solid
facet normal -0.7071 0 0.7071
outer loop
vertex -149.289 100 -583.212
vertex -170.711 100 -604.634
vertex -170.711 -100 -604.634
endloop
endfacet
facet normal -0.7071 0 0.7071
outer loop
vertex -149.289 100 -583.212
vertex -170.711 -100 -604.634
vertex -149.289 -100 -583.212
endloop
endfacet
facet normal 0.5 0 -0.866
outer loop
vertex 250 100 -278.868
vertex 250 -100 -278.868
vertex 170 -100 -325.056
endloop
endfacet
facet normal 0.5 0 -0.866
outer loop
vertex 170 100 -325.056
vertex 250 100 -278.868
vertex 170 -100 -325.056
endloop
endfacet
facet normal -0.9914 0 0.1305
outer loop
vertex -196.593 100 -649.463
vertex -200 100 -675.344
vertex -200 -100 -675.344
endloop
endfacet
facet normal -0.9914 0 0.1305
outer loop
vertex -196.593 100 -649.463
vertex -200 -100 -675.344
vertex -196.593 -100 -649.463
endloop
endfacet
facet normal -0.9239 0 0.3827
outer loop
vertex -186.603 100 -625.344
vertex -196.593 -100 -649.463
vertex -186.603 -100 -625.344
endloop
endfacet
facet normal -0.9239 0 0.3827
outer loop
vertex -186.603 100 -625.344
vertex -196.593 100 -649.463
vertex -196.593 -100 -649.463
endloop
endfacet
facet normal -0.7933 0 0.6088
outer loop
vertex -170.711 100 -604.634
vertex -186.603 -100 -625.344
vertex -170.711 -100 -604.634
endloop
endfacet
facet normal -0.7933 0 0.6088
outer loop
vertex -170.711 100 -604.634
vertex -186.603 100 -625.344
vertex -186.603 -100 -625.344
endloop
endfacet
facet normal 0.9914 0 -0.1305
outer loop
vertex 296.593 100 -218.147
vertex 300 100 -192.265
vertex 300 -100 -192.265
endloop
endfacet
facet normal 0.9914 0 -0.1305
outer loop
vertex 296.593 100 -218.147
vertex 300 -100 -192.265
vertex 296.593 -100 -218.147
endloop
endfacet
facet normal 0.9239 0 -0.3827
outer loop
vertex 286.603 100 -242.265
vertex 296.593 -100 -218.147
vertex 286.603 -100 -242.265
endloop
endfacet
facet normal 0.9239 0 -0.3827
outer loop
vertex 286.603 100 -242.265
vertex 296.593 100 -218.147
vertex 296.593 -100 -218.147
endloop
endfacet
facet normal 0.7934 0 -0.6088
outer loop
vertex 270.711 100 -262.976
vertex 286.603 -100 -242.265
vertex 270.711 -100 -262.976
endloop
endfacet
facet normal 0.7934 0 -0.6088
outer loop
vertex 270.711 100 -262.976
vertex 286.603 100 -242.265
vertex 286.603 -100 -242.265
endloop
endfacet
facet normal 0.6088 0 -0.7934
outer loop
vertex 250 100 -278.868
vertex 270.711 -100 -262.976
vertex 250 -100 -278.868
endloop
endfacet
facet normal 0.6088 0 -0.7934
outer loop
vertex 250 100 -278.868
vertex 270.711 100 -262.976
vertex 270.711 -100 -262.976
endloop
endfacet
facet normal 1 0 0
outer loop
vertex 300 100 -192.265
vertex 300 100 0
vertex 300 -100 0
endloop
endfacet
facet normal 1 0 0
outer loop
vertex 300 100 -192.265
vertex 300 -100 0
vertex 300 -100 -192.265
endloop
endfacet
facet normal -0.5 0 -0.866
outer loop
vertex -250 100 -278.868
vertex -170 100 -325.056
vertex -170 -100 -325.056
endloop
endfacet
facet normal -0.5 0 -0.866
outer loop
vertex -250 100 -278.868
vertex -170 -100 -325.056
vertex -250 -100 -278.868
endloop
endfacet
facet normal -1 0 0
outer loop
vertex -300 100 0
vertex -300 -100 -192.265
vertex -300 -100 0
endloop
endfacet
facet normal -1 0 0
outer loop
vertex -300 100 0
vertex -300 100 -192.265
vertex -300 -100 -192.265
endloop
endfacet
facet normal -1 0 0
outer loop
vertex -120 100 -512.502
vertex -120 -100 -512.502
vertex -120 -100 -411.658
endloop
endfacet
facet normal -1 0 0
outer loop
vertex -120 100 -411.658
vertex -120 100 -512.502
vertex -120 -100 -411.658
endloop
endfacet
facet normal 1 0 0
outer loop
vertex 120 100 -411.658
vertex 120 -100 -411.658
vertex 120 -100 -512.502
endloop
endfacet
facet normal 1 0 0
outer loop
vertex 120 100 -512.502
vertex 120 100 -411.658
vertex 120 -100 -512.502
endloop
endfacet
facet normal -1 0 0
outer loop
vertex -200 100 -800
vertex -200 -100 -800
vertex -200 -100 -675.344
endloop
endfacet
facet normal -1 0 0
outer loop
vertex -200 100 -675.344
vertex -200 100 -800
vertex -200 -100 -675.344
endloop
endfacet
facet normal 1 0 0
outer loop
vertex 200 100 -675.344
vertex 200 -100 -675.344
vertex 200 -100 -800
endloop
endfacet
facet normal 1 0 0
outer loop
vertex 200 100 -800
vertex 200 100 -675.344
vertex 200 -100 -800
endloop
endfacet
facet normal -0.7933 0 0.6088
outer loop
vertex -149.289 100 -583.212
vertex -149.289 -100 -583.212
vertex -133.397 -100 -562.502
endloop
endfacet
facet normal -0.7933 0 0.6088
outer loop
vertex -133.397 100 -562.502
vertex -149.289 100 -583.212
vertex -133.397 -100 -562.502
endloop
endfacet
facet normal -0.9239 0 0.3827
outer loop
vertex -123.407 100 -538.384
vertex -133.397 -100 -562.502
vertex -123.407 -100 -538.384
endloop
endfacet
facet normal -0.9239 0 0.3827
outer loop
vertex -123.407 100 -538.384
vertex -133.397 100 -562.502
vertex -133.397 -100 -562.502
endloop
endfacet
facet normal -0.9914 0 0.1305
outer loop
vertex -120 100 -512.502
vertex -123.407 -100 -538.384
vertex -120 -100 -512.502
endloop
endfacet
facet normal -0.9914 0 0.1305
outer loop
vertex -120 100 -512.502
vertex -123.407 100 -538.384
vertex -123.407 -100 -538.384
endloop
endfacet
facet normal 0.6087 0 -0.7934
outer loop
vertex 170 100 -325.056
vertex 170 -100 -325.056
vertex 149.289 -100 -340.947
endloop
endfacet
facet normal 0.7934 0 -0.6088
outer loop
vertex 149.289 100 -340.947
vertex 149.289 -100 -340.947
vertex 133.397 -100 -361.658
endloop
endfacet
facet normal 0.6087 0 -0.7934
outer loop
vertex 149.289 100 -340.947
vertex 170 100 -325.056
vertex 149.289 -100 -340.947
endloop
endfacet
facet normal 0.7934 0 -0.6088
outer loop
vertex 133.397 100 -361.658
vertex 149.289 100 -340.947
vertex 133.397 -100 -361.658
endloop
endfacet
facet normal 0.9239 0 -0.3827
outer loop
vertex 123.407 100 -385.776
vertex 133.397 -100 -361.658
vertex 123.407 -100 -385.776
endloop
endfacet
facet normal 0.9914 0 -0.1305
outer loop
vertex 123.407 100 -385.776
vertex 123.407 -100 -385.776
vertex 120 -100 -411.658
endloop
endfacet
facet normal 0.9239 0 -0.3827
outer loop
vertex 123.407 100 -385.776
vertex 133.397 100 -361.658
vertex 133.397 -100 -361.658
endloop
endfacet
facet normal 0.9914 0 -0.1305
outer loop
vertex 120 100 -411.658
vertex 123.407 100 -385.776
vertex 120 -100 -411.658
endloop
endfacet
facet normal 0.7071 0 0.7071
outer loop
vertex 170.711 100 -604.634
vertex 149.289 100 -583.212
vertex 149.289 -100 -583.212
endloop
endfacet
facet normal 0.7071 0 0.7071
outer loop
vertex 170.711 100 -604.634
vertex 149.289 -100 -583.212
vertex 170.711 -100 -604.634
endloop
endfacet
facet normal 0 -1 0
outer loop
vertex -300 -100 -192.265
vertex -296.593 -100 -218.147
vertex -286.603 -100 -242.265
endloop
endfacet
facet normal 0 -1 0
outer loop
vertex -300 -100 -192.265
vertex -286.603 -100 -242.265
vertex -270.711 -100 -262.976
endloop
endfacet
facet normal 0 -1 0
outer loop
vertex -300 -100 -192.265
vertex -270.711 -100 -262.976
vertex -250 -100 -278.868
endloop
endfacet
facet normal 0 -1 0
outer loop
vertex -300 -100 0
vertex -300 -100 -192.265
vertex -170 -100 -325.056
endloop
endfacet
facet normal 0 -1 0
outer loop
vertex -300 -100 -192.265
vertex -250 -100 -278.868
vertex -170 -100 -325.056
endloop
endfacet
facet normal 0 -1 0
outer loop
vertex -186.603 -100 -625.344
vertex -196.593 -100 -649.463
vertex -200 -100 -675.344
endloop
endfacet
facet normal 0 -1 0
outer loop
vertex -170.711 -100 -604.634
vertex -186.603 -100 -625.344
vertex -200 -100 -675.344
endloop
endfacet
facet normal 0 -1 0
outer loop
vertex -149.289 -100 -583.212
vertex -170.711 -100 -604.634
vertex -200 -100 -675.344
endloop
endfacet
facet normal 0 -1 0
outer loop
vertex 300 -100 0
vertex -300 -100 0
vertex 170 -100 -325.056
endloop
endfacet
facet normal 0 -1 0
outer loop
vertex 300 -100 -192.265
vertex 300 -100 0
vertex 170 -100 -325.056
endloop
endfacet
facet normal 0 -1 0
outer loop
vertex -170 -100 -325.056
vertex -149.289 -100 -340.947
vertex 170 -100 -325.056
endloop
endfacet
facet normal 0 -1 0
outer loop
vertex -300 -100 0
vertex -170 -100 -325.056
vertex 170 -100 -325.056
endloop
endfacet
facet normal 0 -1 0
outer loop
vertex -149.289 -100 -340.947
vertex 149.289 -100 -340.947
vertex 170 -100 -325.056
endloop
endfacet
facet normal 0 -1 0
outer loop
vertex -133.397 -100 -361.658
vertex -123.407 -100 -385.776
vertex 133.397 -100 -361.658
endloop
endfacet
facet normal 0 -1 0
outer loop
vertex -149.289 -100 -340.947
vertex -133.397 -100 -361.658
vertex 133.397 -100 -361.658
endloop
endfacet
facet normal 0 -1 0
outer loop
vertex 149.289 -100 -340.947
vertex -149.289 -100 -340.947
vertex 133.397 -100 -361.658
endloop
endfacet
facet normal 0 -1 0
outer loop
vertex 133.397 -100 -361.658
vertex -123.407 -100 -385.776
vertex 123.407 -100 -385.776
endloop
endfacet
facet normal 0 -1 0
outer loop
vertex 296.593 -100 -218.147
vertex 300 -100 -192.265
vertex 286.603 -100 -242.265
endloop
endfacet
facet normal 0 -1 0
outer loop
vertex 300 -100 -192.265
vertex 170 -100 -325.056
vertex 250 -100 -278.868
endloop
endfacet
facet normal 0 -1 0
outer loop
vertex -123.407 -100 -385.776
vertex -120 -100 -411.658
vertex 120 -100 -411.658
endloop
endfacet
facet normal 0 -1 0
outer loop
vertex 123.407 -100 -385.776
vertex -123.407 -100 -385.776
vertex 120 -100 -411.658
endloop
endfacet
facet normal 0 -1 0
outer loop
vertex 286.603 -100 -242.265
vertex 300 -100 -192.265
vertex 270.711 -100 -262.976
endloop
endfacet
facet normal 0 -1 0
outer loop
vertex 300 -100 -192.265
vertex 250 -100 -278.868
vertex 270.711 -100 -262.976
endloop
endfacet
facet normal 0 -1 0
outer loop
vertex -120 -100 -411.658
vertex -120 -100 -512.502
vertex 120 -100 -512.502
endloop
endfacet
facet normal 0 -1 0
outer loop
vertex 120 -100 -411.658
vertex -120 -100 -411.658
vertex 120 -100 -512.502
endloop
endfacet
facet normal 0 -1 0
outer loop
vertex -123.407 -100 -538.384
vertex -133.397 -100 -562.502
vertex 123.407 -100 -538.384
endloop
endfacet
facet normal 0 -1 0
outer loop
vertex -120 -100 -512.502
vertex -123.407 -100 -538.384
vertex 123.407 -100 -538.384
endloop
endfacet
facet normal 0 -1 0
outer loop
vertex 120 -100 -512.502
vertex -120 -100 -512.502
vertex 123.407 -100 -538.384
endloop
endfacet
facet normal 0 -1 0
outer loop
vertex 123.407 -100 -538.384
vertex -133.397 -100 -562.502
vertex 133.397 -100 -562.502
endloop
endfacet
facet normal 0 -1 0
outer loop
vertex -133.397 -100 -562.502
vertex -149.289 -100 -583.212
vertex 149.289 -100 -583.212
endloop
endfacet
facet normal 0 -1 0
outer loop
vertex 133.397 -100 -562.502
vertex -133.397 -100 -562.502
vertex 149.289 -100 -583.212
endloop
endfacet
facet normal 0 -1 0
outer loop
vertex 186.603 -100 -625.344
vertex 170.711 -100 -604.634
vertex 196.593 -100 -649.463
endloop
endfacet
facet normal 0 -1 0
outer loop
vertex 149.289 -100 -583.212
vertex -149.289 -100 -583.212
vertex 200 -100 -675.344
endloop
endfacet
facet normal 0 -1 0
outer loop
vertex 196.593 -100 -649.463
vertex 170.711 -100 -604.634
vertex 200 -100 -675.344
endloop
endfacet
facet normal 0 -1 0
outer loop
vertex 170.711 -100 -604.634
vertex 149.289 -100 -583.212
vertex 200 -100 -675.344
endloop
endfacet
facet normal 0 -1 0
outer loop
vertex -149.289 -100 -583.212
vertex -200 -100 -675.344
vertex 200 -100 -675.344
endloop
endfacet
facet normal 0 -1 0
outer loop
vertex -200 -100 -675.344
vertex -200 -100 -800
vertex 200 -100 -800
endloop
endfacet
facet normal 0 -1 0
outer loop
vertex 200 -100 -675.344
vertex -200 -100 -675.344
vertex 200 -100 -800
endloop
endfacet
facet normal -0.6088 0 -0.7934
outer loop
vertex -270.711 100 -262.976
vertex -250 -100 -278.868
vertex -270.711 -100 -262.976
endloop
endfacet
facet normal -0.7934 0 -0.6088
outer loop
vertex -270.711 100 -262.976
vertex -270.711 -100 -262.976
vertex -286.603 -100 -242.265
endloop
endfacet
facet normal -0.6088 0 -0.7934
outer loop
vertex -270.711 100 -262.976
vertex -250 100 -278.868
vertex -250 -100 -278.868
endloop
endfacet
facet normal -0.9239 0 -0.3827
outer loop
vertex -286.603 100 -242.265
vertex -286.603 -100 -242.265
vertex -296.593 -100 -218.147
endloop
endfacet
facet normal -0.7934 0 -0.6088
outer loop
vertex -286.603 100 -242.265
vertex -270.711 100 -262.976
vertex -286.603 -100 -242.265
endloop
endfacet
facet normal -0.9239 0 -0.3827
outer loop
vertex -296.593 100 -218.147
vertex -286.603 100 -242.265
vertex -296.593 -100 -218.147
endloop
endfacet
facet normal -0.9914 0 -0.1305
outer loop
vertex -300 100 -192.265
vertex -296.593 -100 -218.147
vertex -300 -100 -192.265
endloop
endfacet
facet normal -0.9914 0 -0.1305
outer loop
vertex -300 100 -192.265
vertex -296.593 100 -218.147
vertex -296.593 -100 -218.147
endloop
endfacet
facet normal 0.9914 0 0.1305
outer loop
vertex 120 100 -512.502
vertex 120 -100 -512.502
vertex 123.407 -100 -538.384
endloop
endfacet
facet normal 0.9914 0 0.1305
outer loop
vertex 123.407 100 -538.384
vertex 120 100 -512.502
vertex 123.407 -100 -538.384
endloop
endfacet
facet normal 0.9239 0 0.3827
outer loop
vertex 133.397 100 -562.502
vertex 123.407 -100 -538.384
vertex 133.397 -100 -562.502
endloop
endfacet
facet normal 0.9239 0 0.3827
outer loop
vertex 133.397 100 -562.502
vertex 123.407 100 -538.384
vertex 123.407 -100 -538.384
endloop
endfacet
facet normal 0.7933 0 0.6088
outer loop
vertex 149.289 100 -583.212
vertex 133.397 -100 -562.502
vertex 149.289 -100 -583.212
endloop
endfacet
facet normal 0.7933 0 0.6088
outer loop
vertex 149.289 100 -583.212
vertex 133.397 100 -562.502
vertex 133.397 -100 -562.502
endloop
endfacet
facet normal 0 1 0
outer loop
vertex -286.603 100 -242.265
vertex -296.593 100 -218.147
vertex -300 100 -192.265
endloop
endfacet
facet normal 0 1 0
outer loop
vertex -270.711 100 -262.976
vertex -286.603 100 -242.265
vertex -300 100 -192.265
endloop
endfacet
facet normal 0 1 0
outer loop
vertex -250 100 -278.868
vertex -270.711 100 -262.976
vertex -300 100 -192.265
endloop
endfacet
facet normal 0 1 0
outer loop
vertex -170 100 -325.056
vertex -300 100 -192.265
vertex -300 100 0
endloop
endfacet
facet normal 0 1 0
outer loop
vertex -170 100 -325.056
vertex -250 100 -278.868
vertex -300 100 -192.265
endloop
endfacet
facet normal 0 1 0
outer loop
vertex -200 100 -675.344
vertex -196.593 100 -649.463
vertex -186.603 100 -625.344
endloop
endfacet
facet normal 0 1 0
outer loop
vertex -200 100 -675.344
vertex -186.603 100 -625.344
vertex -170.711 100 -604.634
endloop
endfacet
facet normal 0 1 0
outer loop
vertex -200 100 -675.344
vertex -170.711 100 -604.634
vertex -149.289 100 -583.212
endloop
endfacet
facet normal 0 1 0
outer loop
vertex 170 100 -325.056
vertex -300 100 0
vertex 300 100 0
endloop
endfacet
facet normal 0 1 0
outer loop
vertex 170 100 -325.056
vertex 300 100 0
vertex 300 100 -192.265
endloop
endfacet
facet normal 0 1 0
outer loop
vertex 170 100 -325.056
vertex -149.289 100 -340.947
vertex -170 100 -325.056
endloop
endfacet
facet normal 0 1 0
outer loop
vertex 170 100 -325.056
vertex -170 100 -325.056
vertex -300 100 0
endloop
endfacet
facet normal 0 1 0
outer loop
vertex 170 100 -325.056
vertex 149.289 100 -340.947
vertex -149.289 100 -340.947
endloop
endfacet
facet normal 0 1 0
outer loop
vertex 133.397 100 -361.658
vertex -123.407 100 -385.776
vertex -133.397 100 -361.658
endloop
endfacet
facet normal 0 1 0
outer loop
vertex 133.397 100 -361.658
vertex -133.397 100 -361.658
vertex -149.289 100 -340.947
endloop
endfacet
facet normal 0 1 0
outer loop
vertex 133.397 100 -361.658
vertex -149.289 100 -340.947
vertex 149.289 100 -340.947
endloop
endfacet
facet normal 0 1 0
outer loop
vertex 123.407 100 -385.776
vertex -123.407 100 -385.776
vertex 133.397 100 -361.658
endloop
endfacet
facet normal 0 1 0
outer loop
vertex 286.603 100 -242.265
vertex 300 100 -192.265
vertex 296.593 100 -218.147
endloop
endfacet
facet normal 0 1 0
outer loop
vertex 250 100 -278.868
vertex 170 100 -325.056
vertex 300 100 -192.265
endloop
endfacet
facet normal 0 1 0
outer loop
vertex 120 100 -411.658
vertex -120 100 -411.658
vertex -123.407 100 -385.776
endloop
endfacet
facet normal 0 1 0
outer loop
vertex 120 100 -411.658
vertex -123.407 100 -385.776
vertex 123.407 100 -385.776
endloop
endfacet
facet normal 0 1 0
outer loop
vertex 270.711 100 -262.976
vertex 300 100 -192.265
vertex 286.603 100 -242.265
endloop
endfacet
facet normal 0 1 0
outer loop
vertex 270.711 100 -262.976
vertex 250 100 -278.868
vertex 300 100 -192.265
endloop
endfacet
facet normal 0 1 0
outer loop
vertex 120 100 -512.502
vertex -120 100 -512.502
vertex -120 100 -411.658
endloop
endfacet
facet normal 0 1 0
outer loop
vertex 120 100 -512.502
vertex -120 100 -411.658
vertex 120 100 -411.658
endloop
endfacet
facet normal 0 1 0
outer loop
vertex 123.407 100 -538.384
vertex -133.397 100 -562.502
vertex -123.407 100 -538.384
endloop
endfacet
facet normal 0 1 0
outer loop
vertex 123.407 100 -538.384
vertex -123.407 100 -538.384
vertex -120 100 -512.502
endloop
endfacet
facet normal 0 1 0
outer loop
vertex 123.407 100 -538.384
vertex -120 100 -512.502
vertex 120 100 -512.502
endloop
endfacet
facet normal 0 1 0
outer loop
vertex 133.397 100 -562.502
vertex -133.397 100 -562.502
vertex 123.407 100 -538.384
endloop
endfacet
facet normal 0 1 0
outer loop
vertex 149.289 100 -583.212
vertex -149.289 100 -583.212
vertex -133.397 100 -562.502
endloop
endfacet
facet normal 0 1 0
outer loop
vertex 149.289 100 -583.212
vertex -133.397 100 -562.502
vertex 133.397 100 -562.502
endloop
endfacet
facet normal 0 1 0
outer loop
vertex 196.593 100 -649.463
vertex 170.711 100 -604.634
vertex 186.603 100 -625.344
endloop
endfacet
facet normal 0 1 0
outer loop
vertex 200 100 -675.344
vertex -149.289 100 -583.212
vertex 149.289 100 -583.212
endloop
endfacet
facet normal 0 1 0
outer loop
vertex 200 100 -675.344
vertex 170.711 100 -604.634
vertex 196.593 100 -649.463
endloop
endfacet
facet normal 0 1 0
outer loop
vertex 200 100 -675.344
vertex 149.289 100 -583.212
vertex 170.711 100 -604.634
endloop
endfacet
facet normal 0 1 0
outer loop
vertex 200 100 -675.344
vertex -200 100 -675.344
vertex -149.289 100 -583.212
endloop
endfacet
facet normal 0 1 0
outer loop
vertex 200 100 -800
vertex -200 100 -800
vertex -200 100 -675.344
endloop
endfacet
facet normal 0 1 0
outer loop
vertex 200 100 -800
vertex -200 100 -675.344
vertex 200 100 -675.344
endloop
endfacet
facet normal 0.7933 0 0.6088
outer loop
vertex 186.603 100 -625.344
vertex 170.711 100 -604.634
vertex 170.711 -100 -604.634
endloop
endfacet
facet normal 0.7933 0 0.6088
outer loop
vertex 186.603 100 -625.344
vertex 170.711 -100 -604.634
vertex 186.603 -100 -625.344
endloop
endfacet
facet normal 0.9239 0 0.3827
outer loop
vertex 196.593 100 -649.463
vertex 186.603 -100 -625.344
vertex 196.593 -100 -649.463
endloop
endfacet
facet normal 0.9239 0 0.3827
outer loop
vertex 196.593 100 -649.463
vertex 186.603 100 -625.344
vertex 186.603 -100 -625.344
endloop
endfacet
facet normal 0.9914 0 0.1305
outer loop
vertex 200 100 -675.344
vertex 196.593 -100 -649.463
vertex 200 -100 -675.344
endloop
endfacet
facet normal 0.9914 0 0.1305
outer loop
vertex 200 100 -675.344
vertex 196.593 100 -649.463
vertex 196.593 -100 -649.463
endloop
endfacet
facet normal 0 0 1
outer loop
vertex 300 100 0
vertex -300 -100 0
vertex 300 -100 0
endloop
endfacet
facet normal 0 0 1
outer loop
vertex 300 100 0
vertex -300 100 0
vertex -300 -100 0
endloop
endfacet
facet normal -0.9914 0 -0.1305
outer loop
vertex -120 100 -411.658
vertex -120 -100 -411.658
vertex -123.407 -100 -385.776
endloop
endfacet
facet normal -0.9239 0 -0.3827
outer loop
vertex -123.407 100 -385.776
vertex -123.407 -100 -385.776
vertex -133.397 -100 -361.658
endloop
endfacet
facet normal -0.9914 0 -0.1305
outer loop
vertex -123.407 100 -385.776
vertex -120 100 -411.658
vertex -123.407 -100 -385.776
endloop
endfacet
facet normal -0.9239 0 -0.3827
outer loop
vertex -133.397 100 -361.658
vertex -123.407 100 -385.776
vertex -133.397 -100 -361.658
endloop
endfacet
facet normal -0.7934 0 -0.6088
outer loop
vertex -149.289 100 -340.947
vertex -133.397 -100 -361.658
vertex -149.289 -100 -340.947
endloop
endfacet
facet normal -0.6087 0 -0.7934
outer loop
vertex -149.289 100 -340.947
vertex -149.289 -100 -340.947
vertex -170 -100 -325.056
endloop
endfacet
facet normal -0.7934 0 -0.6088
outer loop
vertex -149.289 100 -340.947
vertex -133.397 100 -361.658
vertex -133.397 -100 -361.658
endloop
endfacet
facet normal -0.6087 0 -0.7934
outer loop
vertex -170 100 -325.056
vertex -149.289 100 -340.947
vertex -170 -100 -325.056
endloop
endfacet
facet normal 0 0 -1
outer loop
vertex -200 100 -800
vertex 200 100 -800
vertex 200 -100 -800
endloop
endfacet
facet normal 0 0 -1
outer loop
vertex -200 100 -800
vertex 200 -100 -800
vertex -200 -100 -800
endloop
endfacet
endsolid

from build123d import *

# Parameters (mm, degrees)
BOSS_EXTRUDE1_DEPTH = 100


with BuildPart() as part:
    # Sketch1 → Boss-Extrude1 (new, symmetric)
    with BuildSketch(Plane(origin=(0, 0, 0), x_dir=(1, 0, 0), z_dir=(0, 1, 0))):
        with BuildLine():
            Line((-300, 0), (300, 0))
            Line((300, 0), (300, 192.264973081))
            ThreePointArc((300, 192.264973081), (286.602540378, 242.264973081), (250, 278.867513459))
            Line((250, 278.867513459), (170, 325.055534995))
            ThreePointArc((170, 325.055534995), (133.397459622, 361.658075373), (120, 411.658075373))
            Line((120, 411.658075373), (120, 512.501692217))
            ThreePointArc((120, 512.501692217), (127.612046749, 550.770035453), (149.289321881, 583.212370335))
            Line((149.289321881, 583.212370335), (170.710678119, 604.633726573))
            ThreePointArc((170.710678119, 604.633726573), (192.387953251, 637.076061455), (200, 675.344404691))
            Line((200, 675.344404691), (200, 800))
            Line((200, 800), (-200, 800))
            Line((-200, 800), (-200, 675.344404691))
            ThreePointArc((-200, 675.344404691), (-192.387953251, 637.076061455), (-170.710678119, 604.633726573))
            Line((-170.710678119, 604.633726573), (-149.289321881, 583.212370335))
            ThreePointArc((-149.289321881, 583.212370335), (-127.612046749, 550.770035453), (-120, 512.501692217))
            Line((-120, 512.501692217), (-120, 411.658075373))
            ThreePointArc((-120, 411.658075373), (-133.397459622, 361.658075373), (-170, 325.055534995))
            Line((-170, 325.055534995), (-250, 278.867513459))
            ThreePointArc((-250, 278.867513459), (-286.602540378, 242.264973081), (-300, 192.264973081))
            Line((-300, 192.264973081), (-300, 0))
        make_face()
    extrude(amount=BOSS_EXTRUDE1_DEPTH, both=True)


solid = part.part
